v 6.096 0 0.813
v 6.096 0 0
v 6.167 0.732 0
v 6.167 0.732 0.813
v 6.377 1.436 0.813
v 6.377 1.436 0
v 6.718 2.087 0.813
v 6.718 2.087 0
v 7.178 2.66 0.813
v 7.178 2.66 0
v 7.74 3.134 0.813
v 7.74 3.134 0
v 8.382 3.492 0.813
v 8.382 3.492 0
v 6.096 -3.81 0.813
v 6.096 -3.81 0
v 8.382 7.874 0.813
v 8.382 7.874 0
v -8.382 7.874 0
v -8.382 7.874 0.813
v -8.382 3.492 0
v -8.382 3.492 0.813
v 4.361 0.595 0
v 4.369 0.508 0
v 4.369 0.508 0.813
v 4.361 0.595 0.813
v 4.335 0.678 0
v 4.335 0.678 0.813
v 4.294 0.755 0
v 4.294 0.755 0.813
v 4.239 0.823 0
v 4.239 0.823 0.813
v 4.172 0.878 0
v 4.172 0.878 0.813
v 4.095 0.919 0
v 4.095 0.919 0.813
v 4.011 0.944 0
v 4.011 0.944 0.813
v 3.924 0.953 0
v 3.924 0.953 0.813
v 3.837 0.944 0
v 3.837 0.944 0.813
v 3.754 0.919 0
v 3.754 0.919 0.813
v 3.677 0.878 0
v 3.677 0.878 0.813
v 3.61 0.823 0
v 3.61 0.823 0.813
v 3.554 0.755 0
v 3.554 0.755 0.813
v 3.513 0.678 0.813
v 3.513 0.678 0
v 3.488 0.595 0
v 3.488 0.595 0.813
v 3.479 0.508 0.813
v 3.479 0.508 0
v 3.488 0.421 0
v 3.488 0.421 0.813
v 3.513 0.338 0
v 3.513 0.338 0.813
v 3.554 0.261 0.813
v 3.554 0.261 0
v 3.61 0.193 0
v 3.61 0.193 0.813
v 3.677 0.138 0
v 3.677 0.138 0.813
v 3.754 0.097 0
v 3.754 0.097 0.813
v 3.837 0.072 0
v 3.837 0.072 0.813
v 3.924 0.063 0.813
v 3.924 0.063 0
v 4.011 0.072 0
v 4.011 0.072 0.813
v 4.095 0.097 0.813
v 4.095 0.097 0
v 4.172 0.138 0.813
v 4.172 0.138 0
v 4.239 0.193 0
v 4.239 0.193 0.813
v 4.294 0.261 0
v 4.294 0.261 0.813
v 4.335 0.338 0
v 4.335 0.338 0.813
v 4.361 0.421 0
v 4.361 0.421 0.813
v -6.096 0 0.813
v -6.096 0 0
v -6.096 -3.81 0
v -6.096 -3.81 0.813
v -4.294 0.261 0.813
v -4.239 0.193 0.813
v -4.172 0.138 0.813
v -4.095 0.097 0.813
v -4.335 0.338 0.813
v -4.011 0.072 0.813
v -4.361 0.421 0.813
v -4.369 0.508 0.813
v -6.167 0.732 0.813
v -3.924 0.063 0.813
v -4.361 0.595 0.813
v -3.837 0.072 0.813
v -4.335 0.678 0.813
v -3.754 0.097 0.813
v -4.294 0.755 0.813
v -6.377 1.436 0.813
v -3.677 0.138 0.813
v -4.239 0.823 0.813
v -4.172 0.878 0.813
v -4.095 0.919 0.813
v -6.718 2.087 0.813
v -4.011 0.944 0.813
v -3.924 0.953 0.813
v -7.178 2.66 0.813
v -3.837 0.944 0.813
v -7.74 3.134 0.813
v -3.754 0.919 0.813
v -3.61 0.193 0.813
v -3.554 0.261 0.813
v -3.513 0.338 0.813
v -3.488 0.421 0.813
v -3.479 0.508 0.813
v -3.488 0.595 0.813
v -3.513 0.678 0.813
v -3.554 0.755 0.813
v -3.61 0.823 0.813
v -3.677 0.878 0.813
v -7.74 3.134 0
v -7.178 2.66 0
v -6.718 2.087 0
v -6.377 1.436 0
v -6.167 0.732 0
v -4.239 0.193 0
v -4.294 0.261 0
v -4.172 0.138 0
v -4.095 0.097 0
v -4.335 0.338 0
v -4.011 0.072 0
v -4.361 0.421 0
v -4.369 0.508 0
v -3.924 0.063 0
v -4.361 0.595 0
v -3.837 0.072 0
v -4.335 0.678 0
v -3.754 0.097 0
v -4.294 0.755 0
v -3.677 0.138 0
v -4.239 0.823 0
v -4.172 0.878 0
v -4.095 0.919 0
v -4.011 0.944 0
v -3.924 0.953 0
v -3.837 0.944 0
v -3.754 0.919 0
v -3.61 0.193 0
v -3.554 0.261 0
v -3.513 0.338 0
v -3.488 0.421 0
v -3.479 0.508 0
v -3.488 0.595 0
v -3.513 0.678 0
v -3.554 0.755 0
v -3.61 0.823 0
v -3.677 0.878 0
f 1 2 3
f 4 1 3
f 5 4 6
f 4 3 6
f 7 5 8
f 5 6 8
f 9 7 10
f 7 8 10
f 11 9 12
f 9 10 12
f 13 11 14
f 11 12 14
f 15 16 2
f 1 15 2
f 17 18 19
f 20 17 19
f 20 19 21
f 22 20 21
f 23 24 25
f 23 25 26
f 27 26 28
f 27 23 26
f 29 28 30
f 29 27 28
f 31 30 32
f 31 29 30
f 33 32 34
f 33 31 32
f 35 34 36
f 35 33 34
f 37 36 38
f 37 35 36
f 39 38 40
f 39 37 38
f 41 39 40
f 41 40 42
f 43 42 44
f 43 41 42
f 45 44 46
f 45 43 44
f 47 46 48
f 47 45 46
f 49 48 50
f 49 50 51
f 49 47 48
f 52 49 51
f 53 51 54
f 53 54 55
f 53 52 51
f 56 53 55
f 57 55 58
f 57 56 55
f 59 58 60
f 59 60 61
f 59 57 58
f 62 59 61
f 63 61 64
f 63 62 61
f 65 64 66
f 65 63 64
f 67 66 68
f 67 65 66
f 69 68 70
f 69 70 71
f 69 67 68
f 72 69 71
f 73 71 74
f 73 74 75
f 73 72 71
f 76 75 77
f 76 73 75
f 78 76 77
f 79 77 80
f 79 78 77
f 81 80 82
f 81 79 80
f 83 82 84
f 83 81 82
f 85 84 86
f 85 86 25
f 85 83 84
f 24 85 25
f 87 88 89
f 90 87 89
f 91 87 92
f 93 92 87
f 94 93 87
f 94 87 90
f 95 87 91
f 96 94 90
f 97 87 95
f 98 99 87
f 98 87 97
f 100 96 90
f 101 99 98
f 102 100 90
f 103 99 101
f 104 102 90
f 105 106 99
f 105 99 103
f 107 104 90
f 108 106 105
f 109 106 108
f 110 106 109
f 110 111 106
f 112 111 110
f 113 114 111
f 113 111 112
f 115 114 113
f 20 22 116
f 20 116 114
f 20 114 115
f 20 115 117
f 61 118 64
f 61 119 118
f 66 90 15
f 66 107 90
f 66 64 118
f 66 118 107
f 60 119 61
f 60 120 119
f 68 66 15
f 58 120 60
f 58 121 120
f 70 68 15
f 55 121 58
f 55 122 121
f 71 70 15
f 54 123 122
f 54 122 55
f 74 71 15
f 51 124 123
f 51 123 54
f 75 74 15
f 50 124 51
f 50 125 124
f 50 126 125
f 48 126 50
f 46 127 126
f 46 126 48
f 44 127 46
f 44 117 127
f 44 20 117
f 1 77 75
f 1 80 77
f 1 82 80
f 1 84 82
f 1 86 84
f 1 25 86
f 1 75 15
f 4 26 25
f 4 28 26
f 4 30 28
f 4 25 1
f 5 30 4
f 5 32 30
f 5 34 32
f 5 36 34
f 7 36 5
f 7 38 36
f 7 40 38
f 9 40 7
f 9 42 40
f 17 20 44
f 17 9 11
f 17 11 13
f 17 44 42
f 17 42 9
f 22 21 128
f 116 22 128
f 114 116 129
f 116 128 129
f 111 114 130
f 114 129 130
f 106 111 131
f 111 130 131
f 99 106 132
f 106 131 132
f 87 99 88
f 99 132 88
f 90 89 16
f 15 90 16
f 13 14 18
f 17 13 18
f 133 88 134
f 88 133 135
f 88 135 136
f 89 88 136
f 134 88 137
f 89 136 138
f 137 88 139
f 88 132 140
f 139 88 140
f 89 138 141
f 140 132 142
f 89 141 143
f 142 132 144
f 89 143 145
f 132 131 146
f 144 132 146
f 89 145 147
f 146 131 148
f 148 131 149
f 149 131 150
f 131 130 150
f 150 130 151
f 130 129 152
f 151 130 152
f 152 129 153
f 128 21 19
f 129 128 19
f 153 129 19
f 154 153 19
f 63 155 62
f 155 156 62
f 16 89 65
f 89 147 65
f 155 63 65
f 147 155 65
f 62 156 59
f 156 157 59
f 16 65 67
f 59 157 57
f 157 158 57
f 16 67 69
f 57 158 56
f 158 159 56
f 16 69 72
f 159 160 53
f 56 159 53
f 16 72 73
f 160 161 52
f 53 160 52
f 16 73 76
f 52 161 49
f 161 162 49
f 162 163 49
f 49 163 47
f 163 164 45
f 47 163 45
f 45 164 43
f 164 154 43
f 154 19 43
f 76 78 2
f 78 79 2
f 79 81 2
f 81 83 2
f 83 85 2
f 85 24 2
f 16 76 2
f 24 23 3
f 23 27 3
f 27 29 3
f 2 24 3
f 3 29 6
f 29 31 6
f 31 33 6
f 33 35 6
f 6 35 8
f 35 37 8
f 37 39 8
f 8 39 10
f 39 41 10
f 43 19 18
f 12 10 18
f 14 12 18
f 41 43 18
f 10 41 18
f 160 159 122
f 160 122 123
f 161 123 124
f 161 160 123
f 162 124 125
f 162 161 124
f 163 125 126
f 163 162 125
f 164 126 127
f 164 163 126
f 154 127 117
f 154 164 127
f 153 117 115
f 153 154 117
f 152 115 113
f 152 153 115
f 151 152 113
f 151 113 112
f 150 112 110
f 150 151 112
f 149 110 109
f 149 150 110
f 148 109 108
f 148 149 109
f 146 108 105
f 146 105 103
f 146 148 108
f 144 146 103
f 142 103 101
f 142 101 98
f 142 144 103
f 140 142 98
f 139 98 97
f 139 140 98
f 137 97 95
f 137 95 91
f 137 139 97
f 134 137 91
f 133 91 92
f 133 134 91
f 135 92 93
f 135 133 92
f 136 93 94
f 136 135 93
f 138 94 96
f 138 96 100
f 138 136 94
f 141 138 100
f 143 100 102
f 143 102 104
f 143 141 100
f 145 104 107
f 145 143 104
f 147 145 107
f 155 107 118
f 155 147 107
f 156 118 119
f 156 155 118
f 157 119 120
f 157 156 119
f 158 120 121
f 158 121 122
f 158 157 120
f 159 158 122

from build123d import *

# Parameters (mm, degrees)
SKETCH2_W           = 11.43
SKETCH2_H           = 8.89
SKETCH2_R           = 0.445
BOSS_EXTRUDE1_DEPTH = 0.8128
SKETCH4_R           = 0.445
BOSS_EXTRUDE2_DEPTH = 0.8128


with BuildPart() as part:
    # Sketch2 → Boss-Extrude1 (new body)
    with BuildSketch(Plane.XY):
        with Locations((0, 0.635)):
            Rectangle(SKETCH2_W, SKETCH2_H)
        with Locations((-3.9243, 0.508)):
            Circle(SKETCH2_R, mode=Mode.SUBTRACT)
        with Locations((3.9243, 0.508)):
            Circle(SKETCH2_R, mode=Mode.SUBTRACT)
    extrude(amount=BOSS_EXTRUDE1_DEPTH)

    # Sketch4 → Boss-Extrude2 (add)
    with BuildSketch(Plane.XY):
        with BuildLine():
            Line((8.382, 7.874), (-8.382, 7.874))
            Line((-8.382, 7.874), (-8.382, 3.49192268))
            ThreePointArc((-8.382, 3.49192268), (-6.718325299, 2.086822944), (-6.096, 0))
            Line((-6.096, 0), (-6.096, -3.81))
            Line((-6.096, -3.81), (6.096, -3.81))
            Line((6.096, -3.81), (6.096, 0))
            ThreePointArc((6.096, 0), (6.718325299, 2.086822944), (8.382, 3.49192268))
            Line((8.382, 3.49192268), (8.382, 7.874))
        make_face()
        with Locations((-3.9243, 0.508)):
            Circle(SKETCH4_R, mode=Mode.SUBTRACT)
        with Locations((3.9243, 0.508)):
            Circle(SKETCH4_R, mode=Mode.SUBTRACT)
    extrude(amount=BOSS_EXTRUDE2_DEPTH)


solid = part.part
